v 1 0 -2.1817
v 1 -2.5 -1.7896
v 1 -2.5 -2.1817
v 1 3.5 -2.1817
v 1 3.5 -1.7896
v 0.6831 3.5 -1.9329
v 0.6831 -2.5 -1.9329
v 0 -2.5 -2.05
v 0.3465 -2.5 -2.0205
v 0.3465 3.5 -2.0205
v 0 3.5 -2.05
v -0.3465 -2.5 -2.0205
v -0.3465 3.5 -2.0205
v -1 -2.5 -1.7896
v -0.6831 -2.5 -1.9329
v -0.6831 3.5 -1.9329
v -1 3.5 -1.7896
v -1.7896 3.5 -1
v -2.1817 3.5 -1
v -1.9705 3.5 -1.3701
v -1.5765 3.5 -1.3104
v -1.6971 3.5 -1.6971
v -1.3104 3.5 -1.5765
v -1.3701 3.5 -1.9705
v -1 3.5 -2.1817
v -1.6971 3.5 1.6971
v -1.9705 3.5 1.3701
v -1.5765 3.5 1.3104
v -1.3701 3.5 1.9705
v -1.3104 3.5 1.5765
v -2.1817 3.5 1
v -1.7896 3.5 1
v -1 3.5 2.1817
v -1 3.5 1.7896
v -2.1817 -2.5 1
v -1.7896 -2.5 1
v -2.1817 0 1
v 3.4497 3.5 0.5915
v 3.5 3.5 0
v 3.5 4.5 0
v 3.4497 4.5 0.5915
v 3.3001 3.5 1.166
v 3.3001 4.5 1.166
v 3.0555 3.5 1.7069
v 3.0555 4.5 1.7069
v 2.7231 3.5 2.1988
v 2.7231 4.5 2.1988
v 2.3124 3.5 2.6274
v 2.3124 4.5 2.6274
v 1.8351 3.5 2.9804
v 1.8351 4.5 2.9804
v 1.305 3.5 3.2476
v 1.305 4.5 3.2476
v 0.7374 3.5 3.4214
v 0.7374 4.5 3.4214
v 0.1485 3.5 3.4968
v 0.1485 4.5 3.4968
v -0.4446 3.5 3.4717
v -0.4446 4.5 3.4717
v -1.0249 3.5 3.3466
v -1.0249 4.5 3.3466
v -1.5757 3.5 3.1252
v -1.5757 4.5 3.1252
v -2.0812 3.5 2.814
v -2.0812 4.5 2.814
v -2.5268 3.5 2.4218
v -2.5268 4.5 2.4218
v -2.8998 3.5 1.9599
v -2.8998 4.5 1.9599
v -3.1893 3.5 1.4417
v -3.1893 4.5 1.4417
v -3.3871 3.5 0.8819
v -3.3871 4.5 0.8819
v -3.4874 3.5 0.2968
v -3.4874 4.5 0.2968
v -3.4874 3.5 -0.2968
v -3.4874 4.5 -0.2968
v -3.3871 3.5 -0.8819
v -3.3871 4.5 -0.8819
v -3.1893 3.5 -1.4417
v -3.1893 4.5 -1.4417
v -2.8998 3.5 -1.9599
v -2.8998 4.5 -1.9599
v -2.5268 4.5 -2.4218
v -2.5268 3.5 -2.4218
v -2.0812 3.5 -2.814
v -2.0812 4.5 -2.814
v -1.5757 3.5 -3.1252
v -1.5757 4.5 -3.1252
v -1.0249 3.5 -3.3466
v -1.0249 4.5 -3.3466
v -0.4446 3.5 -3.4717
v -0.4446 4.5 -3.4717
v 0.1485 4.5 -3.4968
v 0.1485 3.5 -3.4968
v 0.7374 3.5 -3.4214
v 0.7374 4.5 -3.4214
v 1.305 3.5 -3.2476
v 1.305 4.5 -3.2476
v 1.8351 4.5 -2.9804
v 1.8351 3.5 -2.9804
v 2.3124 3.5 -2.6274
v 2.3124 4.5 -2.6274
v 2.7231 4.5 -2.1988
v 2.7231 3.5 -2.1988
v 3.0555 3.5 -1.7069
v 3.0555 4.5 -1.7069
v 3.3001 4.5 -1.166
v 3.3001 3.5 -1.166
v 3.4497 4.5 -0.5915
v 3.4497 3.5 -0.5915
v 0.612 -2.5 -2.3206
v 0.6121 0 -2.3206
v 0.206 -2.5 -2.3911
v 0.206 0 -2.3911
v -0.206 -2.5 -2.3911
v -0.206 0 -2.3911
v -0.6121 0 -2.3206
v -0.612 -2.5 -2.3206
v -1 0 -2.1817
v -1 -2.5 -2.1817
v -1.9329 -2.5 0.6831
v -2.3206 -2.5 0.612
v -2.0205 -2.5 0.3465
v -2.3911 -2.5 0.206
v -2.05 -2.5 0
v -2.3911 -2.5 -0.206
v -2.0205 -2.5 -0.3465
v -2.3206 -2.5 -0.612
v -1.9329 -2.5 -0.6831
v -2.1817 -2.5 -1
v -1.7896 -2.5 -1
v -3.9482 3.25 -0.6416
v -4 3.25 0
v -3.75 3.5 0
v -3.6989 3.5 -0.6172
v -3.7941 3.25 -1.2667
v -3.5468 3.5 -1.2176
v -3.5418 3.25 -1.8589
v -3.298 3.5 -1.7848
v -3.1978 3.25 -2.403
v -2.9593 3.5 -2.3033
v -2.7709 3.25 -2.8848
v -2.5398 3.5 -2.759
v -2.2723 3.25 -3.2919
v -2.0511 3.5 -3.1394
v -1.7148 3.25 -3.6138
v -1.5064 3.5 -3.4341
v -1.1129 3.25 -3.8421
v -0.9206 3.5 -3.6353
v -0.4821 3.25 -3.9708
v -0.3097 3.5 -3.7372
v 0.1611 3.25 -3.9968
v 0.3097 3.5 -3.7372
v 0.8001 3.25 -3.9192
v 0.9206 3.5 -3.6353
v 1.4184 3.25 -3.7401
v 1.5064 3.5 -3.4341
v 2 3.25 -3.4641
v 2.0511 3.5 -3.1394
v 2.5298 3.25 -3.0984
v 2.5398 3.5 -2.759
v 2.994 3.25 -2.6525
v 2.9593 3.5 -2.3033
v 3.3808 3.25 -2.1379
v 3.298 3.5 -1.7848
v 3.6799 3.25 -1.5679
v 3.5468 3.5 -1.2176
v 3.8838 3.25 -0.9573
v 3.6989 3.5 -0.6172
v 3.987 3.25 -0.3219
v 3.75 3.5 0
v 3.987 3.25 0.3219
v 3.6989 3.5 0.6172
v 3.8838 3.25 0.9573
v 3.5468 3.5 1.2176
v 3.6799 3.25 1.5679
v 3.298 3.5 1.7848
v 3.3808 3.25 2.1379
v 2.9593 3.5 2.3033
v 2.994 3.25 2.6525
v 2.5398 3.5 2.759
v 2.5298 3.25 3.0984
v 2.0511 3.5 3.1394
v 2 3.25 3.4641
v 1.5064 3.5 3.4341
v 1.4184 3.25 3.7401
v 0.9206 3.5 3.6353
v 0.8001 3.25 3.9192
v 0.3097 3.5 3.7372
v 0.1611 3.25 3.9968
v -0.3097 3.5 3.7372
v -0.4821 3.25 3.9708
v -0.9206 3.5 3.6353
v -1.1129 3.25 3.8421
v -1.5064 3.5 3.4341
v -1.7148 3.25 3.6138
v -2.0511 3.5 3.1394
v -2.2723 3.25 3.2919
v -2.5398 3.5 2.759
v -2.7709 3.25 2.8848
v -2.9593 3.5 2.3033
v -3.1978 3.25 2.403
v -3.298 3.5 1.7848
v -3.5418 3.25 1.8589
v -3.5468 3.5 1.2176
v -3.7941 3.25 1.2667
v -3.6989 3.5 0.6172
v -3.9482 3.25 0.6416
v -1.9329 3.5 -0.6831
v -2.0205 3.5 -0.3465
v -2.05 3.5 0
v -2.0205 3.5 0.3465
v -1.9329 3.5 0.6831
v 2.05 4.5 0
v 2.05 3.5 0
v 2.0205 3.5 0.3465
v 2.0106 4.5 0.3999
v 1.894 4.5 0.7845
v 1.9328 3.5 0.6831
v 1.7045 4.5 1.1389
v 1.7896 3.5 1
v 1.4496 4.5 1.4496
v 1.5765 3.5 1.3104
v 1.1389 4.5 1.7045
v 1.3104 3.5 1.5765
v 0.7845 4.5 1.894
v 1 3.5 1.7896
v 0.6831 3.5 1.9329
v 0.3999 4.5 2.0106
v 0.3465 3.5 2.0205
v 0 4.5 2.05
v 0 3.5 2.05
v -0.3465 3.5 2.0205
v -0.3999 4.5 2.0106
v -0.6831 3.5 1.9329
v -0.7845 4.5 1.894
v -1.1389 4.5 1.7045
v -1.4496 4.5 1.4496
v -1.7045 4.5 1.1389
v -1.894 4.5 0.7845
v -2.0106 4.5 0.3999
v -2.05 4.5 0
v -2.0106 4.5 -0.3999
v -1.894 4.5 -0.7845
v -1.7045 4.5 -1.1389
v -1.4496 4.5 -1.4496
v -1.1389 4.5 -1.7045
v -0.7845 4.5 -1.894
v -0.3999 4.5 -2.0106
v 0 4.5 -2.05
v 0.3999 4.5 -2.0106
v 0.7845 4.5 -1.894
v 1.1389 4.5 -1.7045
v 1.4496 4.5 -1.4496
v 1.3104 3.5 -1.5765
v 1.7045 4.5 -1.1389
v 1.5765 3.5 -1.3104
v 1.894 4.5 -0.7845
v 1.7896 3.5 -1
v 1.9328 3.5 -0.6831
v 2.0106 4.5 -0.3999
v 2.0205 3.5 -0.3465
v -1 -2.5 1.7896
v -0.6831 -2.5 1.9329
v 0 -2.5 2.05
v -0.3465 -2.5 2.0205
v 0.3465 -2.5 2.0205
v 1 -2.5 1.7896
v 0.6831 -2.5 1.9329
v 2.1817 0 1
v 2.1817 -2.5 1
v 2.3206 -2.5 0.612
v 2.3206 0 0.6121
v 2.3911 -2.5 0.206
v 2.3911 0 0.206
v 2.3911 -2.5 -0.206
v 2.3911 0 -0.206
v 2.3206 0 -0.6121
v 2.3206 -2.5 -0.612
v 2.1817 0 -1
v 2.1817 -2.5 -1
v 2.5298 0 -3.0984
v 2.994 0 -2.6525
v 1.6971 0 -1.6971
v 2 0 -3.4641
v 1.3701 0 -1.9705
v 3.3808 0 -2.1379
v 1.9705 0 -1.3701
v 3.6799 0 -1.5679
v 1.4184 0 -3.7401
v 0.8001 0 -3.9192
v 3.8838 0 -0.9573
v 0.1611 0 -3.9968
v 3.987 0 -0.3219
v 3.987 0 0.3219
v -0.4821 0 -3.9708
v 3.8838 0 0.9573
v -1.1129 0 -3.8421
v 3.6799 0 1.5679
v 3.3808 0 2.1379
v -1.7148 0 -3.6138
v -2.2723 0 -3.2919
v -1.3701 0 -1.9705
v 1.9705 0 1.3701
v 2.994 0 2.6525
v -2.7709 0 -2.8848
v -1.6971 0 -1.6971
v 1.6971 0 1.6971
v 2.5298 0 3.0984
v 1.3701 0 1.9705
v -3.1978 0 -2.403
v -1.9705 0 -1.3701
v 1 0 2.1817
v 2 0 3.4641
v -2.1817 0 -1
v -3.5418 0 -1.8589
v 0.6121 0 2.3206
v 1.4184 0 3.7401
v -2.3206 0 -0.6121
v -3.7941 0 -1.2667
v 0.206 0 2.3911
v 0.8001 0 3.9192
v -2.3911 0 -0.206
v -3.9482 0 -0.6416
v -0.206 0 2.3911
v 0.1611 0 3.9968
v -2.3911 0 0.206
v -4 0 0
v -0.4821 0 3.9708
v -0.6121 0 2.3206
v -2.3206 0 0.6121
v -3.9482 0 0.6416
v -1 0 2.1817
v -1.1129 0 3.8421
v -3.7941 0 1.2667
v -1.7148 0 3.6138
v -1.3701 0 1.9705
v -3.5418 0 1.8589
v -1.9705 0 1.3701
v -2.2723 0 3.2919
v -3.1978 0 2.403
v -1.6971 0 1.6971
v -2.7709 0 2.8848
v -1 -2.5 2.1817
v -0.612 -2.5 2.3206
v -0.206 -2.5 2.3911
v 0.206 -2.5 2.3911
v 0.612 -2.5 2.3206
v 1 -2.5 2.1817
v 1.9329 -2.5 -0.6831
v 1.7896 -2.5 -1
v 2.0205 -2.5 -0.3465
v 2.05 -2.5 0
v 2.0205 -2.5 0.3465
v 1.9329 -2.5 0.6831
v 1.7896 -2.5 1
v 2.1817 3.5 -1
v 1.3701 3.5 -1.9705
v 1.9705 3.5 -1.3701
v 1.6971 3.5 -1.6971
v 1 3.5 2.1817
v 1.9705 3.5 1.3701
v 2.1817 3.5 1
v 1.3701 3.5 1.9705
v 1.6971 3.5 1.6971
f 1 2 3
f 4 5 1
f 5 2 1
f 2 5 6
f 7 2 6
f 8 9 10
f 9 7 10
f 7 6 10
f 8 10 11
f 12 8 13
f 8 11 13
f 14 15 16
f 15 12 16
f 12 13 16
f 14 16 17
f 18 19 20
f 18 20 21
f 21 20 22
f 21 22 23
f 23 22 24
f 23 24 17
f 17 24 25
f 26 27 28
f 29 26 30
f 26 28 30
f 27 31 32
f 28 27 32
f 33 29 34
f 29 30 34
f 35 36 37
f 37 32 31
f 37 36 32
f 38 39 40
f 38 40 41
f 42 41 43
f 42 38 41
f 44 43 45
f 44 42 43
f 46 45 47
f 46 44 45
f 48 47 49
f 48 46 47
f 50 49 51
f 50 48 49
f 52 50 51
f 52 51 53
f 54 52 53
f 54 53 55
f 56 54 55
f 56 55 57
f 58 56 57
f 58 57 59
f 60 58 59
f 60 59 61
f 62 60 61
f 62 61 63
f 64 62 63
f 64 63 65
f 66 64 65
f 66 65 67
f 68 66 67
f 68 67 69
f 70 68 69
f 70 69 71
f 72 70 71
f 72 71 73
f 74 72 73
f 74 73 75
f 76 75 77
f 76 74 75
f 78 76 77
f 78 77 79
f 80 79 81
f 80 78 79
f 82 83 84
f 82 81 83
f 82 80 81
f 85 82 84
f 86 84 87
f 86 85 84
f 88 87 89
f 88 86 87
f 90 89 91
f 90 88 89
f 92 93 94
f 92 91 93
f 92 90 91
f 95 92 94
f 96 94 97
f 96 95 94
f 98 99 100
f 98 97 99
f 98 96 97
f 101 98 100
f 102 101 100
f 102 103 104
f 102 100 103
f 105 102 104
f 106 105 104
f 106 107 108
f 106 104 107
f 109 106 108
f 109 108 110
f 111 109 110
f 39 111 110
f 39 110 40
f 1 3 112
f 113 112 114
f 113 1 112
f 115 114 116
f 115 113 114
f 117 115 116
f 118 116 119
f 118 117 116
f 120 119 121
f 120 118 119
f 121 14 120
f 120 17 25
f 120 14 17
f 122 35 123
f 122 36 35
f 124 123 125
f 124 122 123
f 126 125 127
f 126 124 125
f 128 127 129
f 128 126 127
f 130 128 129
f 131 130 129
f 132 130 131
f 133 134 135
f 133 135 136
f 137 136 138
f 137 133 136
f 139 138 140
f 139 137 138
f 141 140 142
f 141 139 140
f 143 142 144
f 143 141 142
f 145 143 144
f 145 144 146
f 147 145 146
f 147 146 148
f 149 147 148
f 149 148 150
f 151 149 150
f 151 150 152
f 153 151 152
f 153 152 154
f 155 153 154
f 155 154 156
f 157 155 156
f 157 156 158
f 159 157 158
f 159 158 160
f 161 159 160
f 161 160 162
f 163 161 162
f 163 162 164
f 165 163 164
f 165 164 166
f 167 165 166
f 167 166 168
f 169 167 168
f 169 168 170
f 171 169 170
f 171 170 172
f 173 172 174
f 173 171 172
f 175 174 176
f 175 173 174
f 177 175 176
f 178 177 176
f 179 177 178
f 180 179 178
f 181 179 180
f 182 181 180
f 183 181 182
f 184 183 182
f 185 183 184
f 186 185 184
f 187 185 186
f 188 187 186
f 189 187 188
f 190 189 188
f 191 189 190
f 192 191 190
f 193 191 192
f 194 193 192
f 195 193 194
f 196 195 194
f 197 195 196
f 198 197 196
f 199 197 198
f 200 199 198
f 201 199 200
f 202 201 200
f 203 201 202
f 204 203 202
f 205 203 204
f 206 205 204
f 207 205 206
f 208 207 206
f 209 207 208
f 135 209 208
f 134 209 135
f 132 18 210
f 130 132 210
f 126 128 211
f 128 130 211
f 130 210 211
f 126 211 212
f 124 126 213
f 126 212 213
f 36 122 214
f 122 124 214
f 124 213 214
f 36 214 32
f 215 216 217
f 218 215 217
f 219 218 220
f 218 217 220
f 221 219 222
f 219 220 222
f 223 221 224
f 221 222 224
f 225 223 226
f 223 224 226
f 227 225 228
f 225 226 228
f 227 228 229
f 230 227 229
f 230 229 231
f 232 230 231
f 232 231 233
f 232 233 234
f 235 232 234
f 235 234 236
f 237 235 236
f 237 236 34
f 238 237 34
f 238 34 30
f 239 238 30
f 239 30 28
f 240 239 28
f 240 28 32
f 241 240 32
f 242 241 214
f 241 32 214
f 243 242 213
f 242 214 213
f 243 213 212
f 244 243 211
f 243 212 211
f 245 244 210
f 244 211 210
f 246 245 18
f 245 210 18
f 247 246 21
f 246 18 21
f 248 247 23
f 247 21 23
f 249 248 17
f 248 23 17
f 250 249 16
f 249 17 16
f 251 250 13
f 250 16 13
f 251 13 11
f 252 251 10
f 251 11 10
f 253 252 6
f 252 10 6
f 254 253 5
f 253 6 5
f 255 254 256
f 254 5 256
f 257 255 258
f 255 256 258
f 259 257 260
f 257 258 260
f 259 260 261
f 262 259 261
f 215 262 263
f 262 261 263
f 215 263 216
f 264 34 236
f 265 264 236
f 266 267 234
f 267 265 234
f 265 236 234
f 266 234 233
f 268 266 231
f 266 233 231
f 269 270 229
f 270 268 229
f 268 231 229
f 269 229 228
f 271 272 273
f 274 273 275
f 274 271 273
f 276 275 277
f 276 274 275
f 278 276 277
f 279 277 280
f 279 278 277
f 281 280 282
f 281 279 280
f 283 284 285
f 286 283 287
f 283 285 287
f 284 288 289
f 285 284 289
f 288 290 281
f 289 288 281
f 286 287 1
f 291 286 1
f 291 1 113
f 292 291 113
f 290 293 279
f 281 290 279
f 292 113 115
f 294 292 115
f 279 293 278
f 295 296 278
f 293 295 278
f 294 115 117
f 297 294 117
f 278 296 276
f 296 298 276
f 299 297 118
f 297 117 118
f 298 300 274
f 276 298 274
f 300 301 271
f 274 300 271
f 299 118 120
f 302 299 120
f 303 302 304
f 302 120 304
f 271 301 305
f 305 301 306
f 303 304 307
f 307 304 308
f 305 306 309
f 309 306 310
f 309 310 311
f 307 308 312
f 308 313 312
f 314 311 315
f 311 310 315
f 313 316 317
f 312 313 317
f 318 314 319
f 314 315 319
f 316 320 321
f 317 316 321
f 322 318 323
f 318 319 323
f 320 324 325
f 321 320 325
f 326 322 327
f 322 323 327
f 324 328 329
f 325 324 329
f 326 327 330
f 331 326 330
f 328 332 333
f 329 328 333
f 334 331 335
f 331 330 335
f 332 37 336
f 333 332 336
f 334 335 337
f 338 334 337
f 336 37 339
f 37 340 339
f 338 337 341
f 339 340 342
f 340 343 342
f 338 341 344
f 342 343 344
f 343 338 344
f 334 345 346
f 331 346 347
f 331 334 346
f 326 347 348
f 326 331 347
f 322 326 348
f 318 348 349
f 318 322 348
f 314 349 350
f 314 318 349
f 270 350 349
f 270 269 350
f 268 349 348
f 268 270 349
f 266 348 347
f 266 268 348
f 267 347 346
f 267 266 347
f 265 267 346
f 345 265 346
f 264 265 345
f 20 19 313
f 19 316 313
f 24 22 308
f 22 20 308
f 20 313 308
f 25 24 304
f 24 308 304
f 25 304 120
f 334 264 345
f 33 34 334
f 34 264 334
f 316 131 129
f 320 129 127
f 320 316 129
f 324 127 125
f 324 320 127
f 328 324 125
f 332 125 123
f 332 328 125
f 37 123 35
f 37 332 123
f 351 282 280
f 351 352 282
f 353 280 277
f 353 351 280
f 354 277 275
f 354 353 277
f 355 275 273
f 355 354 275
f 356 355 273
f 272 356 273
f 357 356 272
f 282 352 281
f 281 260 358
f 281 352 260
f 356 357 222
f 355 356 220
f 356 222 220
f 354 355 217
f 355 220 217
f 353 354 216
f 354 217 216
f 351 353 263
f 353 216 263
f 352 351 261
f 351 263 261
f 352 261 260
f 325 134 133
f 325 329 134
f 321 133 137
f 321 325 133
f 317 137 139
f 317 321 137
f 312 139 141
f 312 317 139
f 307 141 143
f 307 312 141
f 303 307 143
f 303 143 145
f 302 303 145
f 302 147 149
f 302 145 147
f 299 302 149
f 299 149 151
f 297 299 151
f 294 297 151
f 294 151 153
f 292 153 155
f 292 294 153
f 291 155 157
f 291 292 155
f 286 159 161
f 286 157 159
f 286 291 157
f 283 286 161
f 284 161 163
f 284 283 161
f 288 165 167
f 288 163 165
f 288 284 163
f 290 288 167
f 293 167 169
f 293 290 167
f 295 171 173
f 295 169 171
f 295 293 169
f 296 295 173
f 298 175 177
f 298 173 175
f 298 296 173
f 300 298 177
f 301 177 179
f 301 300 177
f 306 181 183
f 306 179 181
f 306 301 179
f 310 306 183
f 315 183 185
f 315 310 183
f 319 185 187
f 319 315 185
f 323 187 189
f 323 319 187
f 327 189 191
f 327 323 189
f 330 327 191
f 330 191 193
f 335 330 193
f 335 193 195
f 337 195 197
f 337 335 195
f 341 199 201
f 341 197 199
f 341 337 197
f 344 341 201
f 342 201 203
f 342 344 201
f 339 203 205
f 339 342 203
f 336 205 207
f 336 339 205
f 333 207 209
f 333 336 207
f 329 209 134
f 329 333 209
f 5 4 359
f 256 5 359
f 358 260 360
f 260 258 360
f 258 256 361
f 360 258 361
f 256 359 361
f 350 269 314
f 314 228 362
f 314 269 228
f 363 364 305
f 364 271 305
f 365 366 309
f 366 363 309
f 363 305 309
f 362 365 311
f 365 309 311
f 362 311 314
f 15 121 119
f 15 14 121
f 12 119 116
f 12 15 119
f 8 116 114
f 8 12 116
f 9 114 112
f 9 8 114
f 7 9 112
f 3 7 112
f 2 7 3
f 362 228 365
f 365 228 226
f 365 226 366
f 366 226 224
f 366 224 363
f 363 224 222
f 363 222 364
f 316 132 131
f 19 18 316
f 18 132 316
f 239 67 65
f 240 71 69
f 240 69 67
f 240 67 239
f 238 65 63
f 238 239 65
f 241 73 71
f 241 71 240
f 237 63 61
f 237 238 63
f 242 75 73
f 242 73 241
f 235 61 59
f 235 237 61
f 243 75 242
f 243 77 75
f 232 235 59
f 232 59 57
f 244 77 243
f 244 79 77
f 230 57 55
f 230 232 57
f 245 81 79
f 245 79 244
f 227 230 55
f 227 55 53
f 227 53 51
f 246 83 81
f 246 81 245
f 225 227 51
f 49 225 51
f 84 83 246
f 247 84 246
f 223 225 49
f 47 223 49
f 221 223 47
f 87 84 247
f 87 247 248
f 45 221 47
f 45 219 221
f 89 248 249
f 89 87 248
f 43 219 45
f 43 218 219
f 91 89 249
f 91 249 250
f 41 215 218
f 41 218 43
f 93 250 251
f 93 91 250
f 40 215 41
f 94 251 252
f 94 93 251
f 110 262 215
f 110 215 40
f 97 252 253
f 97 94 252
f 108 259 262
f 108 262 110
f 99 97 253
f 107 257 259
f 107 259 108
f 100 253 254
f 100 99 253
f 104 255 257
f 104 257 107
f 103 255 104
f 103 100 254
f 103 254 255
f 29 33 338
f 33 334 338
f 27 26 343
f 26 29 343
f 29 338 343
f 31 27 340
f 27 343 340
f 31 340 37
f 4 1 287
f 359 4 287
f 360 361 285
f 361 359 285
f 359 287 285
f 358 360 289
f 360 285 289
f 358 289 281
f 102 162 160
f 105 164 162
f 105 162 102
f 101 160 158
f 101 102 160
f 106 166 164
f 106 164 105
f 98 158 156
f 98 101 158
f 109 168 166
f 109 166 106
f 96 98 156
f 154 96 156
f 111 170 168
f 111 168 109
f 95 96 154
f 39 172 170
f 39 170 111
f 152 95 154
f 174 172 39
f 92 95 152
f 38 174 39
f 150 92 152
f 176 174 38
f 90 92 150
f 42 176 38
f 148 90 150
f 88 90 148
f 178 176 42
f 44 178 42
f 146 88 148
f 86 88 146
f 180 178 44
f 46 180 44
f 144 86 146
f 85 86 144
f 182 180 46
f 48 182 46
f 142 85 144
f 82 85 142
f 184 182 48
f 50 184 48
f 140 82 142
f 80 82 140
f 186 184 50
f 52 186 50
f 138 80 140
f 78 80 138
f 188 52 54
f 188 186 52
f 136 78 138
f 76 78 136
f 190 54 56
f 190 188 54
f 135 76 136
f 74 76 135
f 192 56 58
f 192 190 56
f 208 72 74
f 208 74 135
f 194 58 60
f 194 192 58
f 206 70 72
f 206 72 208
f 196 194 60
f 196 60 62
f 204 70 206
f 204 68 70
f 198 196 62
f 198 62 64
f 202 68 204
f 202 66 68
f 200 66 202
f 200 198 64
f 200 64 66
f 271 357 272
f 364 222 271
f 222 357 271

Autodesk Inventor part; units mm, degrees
ref_plane "YZ Plane" through (0, 0, 0) normal (1, 0, 0) x (0, 1, 0)
ref_plane "XZ Plane" through (0, 0, 0) normal (0, 1, 0) x (-1, 0, 0)
ref_plane "XY Plane" through (0, 0, 0) normal (0, 0, 1) x (1, 0, 0)
sketch "Sketch1" plane through (0, 0, 0) normal (0, 1, 0) x (-1, 0, 0)
  circle A0 centre (0, 0) radius 2.4
  circle A1 centre (0, 0) radius 4
  dimension "d0" = 8
  dimension "d1" = 4.8
extrude "Extrusion1" add sketch "Sketch1" along normal blind 3.5
chamfer "Chamfer1" distance 0.25 angle 45 1 edges at (4, 3.5, 0)
sketch "Sketch2" plane through (0, 3.5, 0) normal (0, 1, 0) x (1, 0, 0)
  circle A0 centre (0, 0) radius 2.05
  circle A1 centre (0, 0) radius 3.5
  dimension "d7" = 4.1
  dimension "d8" = 7
extrude "Extrusion2" add sketch "Sketch2" along normal blind 1
sketch "Sketch3" plane through (0, 3.5, 0) normal (0, -1, 0) x (1, 0, 0)
  arc A0 (-1.0733, -2.1466) -> (1, -2.1817) centre (0, 0) ccw
  arc A1 (-1, -1.7896) -> (1, -1.7896) centre (0, 0) ccw
  line L0 (-1, -1.7896) -> (-1, -2.1817)
  line L1 (1, -1.7896) -> (1, -2.1817)
  line L2 (0, 0) -> (0, -5.6159) construction
  dimension "d11" = 2.05
  dimension "d13" = 2.4
  dimension "d14" = 2
extrude "Extrusion3" add sketch "Sketch3" along normal blind 6
pattern_circular "Circular Pattern1" count 4 over 360 about axis through (0, -10, 0) along (0, 1, 0) of "Extrusion3"
properties part number "Collet" material "Acetal Resin, Black"
